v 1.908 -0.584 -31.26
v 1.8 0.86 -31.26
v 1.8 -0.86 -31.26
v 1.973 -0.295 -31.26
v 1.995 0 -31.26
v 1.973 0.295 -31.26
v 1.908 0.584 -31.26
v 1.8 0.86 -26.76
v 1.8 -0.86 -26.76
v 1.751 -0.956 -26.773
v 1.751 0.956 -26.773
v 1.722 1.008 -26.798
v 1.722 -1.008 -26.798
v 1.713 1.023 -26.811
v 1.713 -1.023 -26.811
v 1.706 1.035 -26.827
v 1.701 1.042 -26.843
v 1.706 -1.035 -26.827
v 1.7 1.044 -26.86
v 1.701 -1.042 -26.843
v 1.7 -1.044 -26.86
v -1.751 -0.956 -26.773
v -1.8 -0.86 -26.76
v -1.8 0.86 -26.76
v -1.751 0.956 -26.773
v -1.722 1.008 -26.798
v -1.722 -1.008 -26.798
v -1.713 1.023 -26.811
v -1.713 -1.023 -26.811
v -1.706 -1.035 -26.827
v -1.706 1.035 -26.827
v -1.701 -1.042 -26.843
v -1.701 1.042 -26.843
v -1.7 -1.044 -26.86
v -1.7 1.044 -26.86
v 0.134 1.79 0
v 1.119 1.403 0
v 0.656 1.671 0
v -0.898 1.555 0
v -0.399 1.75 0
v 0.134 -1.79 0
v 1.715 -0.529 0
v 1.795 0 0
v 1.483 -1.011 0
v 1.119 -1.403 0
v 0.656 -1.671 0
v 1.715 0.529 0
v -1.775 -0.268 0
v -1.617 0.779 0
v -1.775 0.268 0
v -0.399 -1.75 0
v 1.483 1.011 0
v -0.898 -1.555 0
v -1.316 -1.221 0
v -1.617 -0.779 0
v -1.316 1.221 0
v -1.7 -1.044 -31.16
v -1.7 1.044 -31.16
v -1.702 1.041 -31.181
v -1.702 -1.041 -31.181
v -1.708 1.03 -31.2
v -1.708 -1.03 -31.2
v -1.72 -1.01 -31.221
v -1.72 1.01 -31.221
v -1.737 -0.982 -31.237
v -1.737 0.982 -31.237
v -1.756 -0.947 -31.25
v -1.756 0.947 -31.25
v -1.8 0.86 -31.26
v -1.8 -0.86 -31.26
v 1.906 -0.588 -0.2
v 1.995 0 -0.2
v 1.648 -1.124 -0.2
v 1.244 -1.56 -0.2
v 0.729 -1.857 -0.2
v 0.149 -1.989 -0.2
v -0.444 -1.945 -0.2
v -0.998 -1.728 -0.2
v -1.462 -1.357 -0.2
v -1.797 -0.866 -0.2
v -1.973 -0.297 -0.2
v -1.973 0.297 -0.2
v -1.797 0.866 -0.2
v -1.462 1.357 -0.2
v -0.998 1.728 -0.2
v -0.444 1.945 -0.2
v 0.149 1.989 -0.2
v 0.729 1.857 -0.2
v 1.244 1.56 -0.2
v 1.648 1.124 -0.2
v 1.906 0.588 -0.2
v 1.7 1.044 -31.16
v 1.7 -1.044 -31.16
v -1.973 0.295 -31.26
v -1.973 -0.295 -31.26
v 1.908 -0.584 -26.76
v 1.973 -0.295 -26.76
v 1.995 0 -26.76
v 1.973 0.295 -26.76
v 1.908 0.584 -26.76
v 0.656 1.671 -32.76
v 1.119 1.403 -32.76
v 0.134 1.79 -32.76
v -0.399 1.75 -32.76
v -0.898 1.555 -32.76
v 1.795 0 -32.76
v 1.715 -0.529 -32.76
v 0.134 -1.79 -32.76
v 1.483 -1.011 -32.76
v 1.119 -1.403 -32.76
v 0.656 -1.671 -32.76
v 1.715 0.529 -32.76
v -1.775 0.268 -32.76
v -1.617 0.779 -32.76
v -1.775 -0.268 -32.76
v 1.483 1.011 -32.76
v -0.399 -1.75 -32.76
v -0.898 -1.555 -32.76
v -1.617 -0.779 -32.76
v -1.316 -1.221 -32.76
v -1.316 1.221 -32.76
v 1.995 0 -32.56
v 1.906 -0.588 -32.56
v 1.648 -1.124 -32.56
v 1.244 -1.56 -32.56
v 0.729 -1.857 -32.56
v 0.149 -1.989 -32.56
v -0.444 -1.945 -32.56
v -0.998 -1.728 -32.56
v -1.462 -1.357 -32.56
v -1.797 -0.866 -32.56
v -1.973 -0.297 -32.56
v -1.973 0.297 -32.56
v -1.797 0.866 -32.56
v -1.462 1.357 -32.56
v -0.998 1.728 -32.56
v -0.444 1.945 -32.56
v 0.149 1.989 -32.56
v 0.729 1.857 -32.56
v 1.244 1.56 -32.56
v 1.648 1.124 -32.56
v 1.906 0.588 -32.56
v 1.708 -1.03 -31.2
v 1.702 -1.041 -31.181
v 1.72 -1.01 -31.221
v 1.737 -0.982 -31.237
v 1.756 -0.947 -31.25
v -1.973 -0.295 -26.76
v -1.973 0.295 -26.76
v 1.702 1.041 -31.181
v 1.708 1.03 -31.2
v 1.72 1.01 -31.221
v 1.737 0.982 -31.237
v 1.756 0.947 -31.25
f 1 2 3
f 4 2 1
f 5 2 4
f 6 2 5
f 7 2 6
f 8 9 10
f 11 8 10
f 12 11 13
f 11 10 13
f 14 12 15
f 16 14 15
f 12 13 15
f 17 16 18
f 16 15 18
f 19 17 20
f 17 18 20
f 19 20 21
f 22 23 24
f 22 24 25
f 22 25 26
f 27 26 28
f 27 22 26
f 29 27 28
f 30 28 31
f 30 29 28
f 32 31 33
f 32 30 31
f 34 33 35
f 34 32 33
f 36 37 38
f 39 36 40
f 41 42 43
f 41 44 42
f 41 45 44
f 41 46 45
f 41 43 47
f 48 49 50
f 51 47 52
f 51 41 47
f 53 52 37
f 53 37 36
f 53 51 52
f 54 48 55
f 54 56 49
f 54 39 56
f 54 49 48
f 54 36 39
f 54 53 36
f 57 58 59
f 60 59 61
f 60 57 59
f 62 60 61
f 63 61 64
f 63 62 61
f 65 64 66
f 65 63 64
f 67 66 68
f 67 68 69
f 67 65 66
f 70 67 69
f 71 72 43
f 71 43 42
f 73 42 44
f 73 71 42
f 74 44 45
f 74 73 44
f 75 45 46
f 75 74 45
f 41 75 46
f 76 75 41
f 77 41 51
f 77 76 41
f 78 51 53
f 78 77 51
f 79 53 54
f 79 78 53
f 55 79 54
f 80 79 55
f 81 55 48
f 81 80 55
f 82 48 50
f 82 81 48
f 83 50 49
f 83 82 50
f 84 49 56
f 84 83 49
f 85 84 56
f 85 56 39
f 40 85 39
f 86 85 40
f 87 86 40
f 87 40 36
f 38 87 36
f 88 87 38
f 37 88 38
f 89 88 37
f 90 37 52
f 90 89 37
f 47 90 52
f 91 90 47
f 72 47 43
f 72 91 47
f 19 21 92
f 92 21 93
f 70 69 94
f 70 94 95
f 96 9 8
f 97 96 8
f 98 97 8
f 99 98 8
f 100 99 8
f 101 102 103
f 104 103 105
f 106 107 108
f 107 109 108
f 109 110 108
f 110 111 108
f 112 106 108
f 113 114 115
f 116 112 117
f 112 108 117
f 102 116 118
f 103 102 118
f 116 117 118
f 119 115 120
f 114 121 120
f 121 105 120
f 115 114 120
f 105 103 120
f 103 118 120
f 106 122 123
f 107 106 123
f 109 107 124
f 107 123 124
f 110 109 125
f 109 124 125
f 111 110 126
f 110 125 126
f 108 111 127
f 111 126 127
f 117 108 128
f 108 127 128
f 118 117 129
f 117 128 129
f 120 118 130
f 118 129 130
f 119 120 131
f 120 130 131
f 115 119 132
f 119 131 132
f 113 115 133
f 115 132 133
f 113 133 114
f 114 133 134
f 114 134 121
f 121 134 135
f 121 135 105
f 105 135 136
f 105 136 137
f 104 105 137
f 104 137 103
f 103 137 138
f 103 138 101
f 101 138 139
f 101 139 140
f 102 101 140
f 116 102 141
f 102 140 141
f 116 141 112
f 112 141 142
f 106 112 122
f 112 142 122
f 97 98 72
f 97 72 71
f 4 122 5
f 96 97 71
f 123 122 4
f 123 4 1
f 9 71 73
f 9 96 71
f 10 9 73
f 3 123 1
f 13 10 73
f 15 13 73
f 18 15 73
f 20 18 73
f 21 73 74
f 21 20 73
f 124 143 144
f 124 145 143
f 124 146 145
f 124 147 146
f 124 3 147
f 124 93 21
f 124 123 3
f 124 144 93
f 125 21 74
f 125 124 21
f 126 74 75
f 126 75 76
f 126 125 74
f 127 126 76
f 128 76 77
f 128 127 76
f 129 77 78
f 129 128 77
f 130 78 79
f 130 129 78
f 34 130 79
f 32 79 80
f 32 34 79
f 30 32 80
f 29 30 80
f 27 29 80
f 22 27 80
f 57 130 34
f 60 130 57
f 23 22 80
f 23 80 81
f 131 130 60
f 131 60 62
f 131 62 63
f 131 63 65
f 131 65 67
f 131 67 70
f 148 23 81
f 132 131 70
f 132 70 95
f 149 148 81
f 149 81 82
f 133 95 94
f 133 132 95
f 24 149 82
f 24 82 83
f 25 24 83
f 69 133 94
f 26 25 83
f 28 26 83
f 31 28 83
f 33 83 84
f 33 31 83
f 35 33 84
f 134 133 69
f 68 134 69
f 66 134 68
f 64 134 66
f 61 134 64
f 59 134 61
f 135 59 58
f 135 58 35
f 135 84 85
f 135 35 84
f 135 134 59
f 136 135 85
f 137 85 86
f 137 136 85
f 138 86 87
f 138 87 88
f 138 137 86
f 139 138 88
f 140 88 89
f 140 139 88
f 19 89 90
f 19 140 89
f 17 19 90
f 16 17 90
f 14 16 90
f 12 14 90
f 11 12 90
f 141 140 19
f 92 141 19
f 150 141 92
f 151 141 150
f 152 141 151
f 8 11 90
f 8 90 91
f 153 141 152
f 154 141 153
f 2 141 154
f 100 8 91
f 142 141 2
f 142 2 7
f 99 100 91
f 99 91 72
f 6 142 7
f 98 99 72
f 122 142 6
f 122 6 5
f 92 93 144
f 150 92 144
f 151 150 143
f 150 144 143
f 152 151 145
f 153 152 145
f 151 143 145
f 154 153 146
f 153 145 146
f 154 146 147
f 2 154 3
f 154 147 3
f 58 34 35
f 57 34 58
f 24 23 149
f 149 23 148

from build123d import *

# Parameters (mm, degrees)
SKIZZE1_W                            = 32.76
SKIZZE1_H                            = 1.995
FASE1_SIZE                           = 0.2
SCHNITT_LINEAR_AUSTRAGEN1_DEPTH      = 33.881265943
SCHNITT_LINEAR_AUSTRAGEN1_DEPTH_BACK = 33.881265943


with BuildPart() as part:
    # Skizze1 → Rotation1 (revolve)
    with BuildSketch(Plane(origin=(0, 0, 0), x_dir=(0, 0, -1), z_dir=(1, 0, 0))):
        with Locations((16.38, 0.9975)):
            Rectangle(SKIZZE1_W, SKIZZE1_H)
    revolve(axis=Axis((0, 0, 50.516901408), (0, 0, -1)))

    # Fase1
    fase1_edges = [part.edges().sort_by_distance(p)[0] for p in [
        (0, -1.995, -32.76),
        (0, -1.995, 0),
    ]]
    chamfer(fase1_edges, length=FASE1_SIZE)

    # Skizze2 → Schnitt-Linear austragen1 (cut, two sides: drawn at the far end of the back side and taken through both)
    with BuildSketch(Plane(origin=(0, 0, 0), x_dir=(1, 0, 0), z_dir=(0, 1, 0)).offset(-SCHNITT_LINEAR_AUSTRAGEN1_DEPTH_BACK)):
        with BuildLine():
            Line((-6.2, 26.76), (-1.8, 26.76))
            ThreePointArc((-1.8, 26.76), (-1.729289322, 26.789289322), (-1.7, 26.86))
            Line((-1.7, 26.86), (-1.7, 31.16))
            ThreePointArc((-1.7, 31.16), (-1.729289322, 31.230710678), (-1.8, 31.26))
            Line((-1.8, 31.26), (-6.2, 31.26))
            Line((-6.2, 31.26), (-6.2, 26.76))
        make_face()
        with BuildLine():
            Line((1.7, 26.86), (1.7, 31.16))
            ThreePointArc((1.7, 31.16), (1.729289322, 31.230710678), (1.8, 31.26))
            Line((1.8, 31.26), (6.2, 31.26))
            Line((6.2, 31.26), (6.2, 26.76))
            Line((6.2, 26.76), (1.8, 26.76))
            ThreePointArc((1.8, 26.76), (1.729289322, 26.789289322), (1.7, 26.86))
        make_face()
    extrude(amount=SCHNITT_LINEAR_AUSTRAGEN1_DEPTH + SCHNITT_LINEAR_AUSTRAGEN1_DEPTH_BACK, mode=Mode.SUBTRACT)


solid = part.part
